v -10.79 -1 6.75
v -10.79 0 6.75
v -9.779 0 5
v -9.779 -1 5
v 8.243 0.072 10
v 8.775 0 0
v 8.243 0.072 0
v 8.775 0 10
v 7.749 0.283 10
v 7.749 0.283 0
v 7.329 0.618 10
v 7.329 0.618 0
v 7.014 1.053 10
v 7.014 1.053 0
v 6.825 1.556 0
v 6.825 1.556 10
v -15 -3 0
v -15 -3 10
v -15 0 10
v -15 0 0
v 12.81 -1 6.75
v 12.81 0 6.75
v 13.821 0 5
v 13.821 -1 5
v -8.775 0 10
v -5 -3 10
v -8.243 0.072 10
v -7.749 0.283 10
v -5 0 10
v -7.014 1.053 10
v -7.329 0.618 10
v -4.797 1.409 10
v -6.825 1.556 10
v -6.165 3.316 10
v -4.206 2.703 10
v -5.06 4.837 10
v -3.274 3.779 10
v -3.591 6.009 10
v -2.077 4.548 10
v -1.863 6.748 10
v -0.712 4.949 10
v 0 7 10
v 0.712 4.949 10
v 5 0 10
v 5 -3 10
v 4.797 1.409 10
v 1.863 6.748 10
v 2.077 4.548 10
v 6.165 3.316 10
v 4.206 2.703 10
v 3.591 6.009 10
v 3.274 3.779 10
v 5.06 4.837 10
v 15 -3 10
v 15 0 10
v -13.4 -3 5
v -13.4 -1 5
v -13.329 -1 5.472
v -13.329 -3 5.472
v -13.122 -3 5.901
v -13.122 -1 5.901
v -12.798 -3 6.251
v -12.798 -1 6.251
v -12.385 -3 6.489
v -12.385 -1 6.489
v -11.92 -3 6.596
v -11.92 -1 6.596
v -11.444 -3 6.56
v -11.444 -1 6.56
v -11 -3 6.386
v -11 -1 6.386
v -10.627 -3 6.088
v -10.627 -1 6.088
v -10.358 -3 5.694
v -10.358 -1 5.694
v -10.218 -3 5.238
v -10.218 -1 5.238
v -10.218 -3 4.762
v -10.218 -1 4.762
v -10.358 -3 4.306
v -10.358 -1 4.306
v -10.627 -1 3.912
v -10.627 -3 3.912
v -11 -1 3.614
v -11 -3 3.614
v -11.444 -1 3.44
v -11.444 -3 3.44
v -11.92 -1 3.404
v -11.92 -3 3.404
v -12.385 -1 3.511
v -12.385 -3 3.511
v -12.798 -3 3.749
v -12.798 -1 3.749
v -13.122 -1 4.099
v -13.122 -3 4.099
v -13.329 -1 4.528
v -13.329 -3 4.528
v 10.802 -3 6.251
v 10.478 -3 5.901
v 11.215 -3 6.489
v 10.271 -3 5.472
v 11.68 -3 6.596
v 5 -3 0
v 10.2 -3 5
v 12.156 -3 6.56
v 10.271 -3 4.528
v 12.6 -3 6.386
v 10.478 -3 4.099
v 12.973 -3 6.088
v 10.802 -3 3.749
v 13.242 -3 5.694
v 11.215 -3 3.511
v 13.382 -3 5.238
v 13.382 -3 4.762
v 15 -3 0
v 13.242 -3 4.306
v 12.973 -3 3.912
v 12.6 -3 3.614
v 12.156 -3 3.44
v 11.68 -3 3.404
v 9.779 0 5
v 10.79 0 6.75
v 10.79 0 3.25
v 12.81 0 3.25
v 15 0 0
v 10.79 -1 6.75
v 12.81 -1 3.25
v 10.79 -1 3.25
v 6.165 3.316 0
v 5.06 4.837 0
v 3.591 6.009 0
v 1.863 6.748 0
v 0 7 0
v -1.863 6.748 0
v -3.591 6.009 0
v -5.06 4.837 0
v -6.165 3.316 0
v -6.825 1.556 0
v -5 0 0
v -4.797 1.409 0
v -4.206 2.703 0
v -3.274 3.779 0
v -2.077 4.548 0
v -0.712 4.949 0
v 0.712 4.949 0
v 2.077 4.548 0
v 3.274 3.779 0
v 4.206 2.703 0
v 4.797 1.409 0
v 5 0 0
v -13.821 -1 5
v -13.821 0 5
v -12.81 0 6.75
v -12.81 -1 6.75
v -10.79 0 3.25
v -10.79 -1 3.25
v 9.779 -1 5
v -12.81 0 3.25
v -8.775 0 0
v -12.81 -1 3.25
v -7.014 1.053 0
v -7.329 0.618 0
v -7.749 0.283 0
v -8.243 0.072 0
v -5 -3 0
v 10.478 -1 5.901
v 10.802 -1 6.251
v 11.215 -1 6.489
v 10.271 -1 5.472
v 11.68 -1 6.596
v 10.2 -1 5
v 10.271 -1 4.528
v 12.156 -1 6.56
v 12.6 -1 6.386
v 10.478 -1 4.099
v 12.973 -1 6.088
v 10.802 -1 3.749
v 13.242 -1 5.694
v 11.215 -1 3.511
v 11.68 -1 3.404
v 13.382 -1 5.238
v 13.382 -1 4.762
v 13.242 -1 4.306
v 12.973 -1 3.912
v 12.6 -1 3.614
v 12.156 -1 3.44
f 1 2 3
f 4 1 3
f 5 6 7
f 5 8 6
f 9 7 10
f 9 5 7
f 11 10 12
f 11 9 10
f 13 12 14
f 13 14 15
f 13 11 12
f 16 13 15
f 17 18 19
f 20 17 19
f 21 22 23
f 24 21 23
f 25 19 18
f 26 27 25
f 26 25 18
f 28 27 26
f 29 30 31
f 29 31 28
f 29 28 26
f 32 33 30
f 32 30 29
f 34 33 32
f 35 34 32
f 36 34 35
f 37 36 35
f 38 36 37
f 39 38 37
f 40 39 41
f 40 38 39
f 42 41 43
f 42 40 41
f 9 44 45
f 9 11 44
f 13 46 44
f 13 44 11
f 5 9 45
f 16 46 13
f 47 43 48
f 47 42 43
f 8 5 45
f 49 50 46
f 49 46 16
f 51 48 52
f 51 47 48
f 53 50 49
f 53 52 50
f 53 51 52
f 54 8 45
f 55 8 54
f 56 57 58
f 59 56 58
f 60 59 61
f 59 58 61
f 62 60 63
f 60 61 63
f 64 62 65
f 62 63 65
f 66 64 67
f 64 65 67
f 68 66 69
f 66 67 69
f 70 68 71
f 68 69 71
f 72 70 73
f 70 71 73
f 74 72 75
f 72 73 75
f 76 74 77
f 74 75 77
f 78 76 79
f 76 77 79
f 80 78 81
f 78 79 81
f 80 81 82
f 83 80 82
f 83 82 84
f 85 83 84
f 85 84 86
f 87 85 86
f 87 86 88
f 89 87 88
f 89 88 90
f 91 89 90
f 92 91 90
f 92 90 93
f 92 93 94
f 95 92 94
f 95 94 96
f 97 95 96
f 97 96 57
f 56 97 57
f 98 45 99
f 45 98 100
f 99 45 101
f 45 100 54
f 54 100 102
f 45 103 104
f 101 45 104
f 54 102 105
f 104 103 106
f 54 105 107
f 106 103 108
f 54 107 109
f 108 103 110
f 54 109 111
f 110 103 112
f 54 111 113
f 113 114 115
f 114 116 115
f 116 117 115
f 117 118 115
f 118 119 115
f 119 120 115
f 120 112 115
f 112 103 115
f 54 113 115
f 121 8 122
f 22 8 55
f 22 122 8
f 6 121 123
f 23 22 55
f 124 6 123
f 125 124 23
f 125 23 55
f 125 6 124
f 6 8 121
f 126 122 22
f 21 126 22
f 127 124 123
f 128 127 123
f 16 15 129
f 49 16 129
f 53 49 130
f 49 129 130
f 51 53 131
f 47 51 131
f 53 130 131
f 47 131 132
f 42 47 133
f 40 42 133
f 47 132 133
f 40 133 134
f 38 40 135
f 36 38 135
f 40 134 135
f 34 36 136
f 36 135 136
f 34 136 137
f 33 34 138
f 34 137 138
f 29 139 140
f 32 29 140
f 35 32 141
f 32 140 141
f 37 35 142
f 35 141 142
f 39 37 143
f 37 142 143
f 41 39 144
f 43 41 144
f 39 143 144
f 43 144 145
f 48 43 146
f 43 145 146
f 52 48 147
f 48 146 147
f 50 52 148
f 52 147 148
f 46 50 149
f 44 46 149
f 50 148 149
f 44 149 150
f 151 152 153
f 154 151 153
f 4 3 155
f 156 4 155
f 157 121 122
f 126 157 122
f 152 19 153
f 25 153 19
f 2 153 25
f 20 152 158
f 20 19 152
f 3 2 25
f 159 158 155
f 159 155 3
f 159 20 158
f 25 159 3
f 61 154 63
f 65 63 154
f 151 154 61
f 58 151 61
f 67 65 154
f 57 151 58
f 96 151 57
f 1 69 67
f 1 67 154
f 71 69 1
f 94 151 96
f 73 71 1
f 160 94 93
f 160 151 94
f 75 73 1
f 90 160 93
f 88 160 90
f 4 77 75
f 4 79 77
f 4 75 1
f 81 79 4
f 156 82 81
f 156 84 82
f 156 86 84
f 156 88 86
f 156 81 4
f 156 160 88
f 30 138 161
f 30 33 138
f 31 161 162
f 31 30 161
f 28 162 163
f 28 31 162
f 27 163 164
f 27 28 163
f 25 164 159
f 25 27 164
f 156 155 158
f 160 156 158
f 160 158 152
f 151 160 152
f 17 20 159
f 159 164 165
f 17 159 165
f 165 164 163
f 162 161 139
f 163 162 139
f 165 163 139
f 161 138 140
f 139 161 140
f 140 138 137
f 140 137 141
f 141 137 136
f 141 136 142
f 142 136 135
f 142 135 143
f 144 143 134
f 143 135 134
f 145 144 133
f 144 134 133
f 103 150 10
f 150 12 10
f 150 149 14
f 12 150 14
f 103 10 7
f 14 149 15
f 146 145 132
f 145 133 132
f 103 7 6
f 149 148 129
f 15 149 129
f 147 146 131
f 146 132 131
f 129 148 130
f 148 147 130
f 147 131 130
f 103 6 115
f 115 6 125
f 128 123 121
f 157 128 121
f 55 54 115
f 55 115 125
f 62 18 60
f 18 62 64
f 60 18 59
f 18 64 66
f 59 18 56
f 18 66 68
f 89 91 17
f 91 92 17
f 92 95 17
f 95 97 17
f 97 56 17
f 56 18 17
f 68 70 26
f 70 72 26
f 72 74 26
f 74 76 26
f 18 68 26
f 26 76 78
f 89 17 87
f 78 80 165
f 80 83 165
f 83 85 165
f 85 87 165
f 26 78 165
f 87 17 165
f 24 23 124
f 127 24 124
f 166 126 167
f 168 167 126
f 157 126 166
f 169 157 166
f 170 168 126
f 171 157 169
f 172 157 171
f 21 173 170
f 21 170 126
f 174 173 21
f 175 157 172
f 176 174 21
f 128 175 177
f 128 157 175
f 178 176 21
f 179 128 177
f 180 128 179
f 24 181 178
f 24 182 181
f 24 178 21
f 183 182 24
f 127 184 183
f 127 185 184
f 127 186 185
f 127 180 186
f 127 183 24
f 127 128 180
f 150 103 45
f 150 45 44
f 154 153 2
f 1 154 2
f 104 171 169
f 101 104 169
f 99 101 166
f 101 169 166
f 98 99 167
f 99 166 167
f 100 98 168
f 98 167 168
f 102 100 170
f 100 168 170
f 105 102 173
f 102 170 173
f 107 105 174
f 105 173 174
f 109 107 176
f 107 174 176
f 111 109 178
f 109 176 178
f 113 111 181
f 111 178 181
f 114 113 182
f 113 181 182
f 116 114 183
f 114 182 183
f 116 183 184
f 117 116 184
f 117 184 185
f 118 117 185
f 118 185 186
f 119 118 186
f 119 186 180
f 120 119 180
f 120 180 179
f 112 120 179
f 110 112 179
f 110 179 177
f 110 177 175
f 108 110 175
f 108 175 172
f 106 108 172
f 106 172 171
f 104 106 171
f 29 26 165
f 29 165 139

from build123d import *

# Parameters (mm, degrees)
SKETCH2_W           = 10
SKETCH2_H           = 3
BOSS_EXTRUDE1_DEPTH = 10
FILLET1_R           = 2
SKETCH3_R           = 1.6
CUT_EXTRUDE1_DEPTH  = 20.339079606
CUT_EXTRUDE2_DEPTH  = 1


with BuildPart() as part:
    # Sketch2 → Boss-Extrude1 (new body)
    with BuildSketch(Plane.XY):
        with Locations((-10, -1.5)):
            Rectangle(SKETCH2_W, SKETCH2_H)
        with BuildLine():
            Line((-7, 0), (-5, 0))
            ThreePointArc((-5, 0), (0, 5), (5, 0))
            Line((5, 0), (7, 0))
            ThreePointArc((7, 0), (0, 7), (-7, 0))
        make_face()
        with Locations((10, -1.5)):
            Rectangle(SKETCH2_W, SKETCH2_H)
    extrude(amount=BOSS_EXTRUDE1_DEPTH)

    # Fillet1
    fillet1_edges = [part.edges().sort_by_distance(p)[0] for p in [
        (-7, 0, 5),
        (7, 0, 5),
    ]]
    fillet(fillet1_edges, radius=FILLET1_R)

    # Sketch3 → Cut-Extrude1 (cut, through all)
    with BuildSketch(Plane(origin=(0, 0, 0), x_dir=(1, 0, 0), z_dir=(0, 1, 0))):
        with Locations(Location((11.8, -5, 0), (0, 0, 180))):
            Circle(SKETCH3_R)
        with Locations(Location((-11.8, -5, 0), (0, 0, 180))):
            Circle(SKETCH3_R)
    extrude(amount=-CUT_EXTRUDE1_DEPTH, mode=Mode.SUBTRACT)

    # Sketch4 → Cut-Extrude2 (cut)
    with BuildSketch(Plane(origin=(0, 0, 0), x_dir=(1, 0, 0), z_dir=(0, 1, 0))):
        Polygon((10.789637029, -6.75), (12.810362971, -6.75), (13.820725942, -5), (12.810362971, -3.25), (10.789637029, -3.25), (9.779274058, -5), align=None)
        Polygon((-12.810362971, -6.75), (-10.789637029, -6.75), (-9.779274058, -5), (-10.789637029, -3.25), (-12.810362971, -3.25), (-13.820725942, -5), align=None)
    extrude(amount=-CUT_EXTRUDE2_DEPTH, mode=Mode.SUBTRACT)


solid = part.part
